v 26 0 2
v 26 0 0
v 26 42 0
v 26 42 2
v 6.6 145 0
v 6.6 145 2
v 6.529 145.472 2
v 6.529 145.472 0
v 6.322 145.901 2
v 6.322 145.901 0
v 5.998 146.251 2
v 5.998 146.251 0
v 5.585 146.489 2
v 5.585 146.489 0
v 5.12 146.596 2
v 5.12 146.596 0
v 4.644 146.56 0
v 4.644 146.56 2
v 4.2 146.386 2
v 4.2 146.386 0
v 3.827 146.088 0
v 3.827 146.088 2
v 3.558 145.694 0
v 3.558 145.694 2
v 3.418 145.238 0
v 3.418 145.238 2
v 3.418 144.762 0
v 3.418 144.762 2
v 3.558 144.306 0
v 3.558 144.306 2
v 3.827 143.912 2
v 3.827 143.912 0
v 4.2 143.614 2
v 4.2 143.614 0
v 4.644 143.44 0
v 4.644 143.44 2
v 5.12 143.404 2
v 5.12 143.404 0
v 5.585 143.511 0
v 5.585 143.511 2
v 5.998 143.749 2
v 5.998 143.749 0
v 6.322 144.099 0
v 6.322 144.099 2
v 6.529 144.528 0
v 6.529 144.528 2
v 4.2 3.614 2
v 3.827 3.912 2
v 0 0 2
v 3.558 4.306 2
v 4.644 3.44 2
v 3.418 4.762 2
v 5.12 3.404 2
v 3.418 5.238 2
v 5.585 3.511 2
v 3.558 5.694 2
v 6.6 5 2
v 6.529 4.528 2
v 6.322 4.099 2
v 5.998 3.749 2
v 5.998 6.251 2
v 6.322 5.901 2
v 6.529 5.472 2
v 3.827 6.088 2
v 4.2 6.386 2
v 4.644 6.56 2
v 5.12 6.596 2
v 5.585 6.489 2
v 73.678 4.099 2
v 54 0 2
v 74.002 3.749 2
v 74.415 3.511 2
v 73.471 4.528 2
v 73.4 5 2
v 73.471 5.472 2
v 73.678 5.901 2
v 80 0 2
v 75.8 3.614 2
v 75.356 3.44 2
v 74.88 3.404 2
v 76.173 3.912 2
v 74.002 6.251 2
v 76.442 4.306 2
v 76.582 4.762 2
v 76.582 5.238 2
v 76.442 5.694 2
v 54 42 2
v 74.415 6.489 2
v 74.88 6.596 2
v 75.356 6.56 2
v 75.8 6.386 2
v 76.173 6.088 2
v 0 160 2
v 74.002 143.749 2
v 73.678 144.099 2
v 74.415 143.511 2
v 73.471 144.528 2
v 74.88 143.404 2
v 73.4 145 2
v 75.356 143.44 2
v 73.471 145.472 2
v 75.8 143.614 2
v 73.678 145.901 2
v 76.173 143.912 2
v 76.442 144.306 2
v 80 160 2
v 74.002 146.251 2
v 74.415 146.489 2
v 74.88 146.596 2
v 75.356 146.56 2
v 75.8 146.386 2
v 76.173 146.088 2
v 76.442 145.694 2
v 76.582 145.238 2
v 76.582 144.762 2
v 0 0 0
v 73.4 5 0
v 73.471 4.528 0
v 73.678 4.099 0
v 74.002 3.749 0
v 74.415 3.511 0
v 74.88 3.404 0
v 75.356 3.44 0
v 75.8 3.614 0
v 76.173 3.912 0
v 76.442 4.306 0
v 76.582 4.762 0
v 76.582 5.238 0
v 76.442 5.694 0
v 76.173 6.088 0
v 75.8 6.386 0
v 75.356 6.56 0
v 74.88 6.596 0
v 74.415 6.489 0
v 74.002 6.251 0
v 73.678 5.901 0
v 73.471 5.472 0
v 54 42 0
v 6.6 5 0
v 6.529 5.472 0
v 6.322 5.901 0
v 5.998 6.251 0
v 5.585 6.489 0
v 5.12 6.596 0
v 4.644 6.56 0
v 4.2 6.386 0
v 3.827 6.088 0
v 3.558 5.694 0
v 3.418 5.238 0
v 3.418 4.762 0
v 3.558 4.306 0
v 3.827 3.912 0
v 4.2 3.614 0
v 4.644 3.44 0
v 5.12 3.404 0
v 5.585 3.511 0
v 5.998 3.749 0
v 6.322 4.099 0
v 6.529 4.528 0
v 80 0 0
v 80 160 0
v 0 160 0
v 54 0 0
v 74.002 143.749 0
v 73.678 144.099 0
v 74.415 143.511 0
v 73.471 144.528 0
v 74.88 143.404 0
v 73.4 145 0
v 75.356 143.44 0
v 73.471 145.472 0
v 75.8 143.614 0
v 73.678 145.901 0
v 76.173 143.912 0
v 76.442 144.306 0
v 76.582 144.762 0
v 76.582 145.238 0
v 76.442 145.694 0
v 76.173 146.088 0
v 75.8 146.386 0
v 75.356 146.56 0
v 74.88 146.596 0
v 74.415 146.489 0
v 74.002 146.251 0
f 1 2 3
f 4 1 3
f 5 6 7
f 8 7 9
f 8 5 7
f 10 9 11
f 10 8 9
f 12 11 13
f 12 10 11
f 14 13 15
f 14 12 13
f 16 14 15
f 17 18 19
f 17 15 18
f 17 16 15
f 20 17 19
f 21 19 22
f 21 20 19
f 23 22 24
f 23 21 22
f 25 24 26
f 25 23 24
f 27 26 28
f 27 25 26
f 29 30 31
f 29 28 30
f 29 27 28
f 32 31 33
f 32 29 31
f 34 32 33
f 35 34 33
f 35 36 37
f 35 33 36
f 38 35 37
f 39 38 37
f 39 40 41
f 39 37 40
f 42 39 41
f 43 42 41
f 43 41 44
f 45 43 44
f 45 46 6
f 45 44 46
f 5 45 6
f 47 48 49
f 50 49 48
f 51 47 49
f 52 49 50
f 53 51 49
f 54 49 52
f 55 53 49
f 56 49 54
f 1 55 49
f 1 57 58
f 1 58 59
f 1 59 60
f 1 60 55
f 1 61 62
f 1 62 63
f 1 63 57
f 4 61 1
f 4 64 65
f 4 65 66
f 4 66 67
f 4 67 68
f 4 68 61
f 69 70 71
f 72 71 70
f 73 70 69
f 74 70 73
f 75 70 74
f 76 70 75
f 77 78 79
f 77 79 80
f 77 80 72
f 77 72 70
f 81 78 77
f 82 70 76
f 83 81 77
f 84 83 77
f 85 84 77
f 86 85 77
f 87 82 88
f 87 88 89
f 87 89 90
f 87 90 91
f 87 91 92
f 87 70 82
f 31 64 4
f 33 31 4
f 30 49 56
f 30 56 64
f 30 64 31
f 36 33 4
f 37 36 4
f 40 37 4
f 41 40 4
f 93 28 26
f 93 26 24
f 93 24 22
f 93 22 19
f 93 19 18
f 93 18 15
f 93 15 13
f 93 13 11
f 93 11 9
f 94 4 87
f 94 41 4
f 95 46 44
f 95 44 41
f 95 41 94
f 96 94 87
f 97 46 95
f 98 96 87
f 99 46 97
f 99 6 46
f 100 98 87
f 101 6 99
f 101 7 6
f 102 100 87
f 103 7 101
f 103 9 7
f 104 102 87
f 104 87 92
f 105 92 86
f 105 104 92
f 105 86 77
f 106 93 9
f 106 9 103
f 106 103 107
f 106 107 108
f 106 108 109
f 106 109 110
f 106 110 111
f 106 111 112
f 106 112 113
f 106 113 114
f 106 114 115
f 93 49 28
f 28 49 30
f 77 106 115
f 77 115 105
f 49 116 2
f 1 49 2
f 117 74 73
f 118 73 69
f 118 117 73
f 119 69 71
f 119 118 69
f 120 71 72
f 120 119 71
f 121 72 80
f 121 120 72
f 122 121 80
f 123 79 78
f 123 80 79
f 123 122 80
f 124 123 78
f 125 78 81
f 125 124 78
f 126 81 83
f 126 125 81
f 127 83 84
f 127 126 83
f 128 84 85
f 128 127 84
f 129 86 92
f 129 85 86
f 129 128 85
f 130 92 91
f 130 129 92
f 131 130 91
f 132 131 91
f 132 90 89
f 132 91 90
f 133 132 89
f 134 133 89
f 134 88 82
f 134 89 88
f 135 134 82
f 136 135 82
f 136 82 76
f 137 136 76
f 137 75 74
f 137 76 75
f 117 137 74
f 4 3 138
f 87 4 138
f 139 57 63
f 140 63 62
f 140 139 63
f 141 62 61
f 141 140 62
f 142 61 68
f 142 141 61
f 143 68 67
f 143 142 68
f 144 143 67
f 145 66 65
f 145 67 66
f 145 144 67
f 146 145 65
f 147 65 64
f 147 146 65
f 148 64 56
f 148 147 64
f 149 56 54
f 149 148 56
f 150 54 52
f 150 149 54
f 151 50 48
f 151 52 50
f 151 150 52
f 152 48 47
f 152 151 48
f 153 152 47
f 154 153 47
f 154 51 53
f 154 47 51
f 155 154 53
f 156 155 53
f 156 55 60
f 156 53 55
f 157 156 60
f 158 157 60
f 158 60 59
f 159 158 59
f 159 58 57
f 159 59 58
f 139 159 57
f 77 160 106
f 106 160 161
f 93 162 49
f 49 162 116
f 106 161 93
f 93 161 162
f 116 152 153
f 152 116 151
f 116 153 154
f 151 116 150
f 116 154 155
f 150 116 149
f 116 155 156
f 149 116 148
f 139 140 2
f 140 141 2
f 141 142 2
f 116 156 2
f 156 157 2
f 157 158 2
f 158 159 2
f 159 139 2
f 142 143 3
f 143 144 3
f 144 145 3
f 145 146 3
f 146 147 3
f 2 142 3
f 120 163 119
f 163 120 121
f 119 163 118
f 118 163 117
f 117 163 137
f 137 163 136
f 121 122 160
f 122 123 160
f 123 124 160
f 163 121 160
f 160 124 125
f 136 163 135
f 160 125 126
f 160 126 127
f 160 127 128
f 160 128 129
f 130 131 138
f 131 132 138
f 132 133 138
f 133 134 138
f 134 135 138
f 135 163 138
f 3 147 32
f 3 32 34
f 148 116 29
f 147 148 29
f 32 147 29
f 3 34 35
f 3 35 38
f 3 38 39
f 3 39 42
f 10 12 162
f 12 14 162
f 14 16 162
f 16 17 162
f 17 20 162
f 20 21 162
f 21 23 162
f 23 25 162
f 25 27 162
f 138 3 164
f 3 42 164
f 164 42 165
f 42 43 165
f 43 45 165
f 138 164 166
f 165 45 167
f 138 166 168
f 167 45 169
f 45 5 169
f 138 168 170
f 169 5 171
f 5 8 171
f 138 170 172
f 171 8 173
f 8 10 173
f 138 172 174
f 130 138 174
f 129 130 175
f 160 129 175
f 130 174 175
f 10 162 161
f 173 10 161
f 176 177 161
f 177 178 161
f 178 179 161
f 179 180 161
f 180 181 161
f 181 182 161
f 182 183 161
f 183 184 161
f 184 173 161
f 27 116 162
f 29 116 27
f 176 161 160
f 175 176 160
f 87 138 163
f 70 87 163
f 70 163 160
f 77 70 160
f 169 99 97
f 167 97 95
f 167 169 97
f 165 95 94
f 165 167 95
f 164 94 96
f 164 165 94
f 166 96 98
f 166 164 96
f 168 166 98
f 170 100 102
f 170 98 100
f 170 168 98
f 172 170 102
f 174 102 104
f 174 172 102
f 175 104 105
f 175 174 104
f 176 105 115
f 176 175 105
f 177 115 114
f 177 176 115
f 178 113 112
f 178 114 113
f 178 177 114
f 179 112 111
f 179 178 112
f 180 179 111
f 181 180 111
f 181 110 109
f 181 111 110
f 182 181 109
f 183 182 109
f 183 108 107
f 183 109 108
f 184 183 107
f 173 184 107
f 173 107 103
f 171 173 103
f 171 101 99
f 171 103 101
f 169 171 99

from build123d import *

# Parameters (mm, degrees)
BOSS_EXTRU_1_DEPTH      = 2
ESQUISSE2_R             = 1.6
ENL_V_MAT_EXTRU_1_DEPTH = 10


with BuildPart() as part:
    # Esquisse1 → Boss.-Extru.1 (new body)
    with BuildSketch(Plane.XY):
        Polygon((80, 160), (40, 160), (40, 42), (54, 42), (54, 0), (80, 0), align=None)
        Polygon((40, 42), (40, 160), (0, 160), (0, 0), (26, 0), (26, 42), align=None)
    extrude(amount=BOSS_EXTRU_1_DEPTH)

    # Esquisse2 → Enlèv. mat.-Extru.1 (cut)
    with BuildSketch(Plane.XY):
        with Locations((5, 145)):
            Circle(ESQUISSE2_R)
        with Locations((5, 5)):
            Circle(ESQUISSE2_R)
        with Locations(Location((75, 5, 0), (0, 0, 180))):
            Circle(ESQUISSE2_R)
        with Locations(Location((75, 145, 0), (0, 0, 180))):
            Circle(ESQUISSE2_R)
    extrude(amount=ENL_V_MAT_EXTRU_1_DEPTH, mode=Mode.SUBTRACT)


solid = part.part
